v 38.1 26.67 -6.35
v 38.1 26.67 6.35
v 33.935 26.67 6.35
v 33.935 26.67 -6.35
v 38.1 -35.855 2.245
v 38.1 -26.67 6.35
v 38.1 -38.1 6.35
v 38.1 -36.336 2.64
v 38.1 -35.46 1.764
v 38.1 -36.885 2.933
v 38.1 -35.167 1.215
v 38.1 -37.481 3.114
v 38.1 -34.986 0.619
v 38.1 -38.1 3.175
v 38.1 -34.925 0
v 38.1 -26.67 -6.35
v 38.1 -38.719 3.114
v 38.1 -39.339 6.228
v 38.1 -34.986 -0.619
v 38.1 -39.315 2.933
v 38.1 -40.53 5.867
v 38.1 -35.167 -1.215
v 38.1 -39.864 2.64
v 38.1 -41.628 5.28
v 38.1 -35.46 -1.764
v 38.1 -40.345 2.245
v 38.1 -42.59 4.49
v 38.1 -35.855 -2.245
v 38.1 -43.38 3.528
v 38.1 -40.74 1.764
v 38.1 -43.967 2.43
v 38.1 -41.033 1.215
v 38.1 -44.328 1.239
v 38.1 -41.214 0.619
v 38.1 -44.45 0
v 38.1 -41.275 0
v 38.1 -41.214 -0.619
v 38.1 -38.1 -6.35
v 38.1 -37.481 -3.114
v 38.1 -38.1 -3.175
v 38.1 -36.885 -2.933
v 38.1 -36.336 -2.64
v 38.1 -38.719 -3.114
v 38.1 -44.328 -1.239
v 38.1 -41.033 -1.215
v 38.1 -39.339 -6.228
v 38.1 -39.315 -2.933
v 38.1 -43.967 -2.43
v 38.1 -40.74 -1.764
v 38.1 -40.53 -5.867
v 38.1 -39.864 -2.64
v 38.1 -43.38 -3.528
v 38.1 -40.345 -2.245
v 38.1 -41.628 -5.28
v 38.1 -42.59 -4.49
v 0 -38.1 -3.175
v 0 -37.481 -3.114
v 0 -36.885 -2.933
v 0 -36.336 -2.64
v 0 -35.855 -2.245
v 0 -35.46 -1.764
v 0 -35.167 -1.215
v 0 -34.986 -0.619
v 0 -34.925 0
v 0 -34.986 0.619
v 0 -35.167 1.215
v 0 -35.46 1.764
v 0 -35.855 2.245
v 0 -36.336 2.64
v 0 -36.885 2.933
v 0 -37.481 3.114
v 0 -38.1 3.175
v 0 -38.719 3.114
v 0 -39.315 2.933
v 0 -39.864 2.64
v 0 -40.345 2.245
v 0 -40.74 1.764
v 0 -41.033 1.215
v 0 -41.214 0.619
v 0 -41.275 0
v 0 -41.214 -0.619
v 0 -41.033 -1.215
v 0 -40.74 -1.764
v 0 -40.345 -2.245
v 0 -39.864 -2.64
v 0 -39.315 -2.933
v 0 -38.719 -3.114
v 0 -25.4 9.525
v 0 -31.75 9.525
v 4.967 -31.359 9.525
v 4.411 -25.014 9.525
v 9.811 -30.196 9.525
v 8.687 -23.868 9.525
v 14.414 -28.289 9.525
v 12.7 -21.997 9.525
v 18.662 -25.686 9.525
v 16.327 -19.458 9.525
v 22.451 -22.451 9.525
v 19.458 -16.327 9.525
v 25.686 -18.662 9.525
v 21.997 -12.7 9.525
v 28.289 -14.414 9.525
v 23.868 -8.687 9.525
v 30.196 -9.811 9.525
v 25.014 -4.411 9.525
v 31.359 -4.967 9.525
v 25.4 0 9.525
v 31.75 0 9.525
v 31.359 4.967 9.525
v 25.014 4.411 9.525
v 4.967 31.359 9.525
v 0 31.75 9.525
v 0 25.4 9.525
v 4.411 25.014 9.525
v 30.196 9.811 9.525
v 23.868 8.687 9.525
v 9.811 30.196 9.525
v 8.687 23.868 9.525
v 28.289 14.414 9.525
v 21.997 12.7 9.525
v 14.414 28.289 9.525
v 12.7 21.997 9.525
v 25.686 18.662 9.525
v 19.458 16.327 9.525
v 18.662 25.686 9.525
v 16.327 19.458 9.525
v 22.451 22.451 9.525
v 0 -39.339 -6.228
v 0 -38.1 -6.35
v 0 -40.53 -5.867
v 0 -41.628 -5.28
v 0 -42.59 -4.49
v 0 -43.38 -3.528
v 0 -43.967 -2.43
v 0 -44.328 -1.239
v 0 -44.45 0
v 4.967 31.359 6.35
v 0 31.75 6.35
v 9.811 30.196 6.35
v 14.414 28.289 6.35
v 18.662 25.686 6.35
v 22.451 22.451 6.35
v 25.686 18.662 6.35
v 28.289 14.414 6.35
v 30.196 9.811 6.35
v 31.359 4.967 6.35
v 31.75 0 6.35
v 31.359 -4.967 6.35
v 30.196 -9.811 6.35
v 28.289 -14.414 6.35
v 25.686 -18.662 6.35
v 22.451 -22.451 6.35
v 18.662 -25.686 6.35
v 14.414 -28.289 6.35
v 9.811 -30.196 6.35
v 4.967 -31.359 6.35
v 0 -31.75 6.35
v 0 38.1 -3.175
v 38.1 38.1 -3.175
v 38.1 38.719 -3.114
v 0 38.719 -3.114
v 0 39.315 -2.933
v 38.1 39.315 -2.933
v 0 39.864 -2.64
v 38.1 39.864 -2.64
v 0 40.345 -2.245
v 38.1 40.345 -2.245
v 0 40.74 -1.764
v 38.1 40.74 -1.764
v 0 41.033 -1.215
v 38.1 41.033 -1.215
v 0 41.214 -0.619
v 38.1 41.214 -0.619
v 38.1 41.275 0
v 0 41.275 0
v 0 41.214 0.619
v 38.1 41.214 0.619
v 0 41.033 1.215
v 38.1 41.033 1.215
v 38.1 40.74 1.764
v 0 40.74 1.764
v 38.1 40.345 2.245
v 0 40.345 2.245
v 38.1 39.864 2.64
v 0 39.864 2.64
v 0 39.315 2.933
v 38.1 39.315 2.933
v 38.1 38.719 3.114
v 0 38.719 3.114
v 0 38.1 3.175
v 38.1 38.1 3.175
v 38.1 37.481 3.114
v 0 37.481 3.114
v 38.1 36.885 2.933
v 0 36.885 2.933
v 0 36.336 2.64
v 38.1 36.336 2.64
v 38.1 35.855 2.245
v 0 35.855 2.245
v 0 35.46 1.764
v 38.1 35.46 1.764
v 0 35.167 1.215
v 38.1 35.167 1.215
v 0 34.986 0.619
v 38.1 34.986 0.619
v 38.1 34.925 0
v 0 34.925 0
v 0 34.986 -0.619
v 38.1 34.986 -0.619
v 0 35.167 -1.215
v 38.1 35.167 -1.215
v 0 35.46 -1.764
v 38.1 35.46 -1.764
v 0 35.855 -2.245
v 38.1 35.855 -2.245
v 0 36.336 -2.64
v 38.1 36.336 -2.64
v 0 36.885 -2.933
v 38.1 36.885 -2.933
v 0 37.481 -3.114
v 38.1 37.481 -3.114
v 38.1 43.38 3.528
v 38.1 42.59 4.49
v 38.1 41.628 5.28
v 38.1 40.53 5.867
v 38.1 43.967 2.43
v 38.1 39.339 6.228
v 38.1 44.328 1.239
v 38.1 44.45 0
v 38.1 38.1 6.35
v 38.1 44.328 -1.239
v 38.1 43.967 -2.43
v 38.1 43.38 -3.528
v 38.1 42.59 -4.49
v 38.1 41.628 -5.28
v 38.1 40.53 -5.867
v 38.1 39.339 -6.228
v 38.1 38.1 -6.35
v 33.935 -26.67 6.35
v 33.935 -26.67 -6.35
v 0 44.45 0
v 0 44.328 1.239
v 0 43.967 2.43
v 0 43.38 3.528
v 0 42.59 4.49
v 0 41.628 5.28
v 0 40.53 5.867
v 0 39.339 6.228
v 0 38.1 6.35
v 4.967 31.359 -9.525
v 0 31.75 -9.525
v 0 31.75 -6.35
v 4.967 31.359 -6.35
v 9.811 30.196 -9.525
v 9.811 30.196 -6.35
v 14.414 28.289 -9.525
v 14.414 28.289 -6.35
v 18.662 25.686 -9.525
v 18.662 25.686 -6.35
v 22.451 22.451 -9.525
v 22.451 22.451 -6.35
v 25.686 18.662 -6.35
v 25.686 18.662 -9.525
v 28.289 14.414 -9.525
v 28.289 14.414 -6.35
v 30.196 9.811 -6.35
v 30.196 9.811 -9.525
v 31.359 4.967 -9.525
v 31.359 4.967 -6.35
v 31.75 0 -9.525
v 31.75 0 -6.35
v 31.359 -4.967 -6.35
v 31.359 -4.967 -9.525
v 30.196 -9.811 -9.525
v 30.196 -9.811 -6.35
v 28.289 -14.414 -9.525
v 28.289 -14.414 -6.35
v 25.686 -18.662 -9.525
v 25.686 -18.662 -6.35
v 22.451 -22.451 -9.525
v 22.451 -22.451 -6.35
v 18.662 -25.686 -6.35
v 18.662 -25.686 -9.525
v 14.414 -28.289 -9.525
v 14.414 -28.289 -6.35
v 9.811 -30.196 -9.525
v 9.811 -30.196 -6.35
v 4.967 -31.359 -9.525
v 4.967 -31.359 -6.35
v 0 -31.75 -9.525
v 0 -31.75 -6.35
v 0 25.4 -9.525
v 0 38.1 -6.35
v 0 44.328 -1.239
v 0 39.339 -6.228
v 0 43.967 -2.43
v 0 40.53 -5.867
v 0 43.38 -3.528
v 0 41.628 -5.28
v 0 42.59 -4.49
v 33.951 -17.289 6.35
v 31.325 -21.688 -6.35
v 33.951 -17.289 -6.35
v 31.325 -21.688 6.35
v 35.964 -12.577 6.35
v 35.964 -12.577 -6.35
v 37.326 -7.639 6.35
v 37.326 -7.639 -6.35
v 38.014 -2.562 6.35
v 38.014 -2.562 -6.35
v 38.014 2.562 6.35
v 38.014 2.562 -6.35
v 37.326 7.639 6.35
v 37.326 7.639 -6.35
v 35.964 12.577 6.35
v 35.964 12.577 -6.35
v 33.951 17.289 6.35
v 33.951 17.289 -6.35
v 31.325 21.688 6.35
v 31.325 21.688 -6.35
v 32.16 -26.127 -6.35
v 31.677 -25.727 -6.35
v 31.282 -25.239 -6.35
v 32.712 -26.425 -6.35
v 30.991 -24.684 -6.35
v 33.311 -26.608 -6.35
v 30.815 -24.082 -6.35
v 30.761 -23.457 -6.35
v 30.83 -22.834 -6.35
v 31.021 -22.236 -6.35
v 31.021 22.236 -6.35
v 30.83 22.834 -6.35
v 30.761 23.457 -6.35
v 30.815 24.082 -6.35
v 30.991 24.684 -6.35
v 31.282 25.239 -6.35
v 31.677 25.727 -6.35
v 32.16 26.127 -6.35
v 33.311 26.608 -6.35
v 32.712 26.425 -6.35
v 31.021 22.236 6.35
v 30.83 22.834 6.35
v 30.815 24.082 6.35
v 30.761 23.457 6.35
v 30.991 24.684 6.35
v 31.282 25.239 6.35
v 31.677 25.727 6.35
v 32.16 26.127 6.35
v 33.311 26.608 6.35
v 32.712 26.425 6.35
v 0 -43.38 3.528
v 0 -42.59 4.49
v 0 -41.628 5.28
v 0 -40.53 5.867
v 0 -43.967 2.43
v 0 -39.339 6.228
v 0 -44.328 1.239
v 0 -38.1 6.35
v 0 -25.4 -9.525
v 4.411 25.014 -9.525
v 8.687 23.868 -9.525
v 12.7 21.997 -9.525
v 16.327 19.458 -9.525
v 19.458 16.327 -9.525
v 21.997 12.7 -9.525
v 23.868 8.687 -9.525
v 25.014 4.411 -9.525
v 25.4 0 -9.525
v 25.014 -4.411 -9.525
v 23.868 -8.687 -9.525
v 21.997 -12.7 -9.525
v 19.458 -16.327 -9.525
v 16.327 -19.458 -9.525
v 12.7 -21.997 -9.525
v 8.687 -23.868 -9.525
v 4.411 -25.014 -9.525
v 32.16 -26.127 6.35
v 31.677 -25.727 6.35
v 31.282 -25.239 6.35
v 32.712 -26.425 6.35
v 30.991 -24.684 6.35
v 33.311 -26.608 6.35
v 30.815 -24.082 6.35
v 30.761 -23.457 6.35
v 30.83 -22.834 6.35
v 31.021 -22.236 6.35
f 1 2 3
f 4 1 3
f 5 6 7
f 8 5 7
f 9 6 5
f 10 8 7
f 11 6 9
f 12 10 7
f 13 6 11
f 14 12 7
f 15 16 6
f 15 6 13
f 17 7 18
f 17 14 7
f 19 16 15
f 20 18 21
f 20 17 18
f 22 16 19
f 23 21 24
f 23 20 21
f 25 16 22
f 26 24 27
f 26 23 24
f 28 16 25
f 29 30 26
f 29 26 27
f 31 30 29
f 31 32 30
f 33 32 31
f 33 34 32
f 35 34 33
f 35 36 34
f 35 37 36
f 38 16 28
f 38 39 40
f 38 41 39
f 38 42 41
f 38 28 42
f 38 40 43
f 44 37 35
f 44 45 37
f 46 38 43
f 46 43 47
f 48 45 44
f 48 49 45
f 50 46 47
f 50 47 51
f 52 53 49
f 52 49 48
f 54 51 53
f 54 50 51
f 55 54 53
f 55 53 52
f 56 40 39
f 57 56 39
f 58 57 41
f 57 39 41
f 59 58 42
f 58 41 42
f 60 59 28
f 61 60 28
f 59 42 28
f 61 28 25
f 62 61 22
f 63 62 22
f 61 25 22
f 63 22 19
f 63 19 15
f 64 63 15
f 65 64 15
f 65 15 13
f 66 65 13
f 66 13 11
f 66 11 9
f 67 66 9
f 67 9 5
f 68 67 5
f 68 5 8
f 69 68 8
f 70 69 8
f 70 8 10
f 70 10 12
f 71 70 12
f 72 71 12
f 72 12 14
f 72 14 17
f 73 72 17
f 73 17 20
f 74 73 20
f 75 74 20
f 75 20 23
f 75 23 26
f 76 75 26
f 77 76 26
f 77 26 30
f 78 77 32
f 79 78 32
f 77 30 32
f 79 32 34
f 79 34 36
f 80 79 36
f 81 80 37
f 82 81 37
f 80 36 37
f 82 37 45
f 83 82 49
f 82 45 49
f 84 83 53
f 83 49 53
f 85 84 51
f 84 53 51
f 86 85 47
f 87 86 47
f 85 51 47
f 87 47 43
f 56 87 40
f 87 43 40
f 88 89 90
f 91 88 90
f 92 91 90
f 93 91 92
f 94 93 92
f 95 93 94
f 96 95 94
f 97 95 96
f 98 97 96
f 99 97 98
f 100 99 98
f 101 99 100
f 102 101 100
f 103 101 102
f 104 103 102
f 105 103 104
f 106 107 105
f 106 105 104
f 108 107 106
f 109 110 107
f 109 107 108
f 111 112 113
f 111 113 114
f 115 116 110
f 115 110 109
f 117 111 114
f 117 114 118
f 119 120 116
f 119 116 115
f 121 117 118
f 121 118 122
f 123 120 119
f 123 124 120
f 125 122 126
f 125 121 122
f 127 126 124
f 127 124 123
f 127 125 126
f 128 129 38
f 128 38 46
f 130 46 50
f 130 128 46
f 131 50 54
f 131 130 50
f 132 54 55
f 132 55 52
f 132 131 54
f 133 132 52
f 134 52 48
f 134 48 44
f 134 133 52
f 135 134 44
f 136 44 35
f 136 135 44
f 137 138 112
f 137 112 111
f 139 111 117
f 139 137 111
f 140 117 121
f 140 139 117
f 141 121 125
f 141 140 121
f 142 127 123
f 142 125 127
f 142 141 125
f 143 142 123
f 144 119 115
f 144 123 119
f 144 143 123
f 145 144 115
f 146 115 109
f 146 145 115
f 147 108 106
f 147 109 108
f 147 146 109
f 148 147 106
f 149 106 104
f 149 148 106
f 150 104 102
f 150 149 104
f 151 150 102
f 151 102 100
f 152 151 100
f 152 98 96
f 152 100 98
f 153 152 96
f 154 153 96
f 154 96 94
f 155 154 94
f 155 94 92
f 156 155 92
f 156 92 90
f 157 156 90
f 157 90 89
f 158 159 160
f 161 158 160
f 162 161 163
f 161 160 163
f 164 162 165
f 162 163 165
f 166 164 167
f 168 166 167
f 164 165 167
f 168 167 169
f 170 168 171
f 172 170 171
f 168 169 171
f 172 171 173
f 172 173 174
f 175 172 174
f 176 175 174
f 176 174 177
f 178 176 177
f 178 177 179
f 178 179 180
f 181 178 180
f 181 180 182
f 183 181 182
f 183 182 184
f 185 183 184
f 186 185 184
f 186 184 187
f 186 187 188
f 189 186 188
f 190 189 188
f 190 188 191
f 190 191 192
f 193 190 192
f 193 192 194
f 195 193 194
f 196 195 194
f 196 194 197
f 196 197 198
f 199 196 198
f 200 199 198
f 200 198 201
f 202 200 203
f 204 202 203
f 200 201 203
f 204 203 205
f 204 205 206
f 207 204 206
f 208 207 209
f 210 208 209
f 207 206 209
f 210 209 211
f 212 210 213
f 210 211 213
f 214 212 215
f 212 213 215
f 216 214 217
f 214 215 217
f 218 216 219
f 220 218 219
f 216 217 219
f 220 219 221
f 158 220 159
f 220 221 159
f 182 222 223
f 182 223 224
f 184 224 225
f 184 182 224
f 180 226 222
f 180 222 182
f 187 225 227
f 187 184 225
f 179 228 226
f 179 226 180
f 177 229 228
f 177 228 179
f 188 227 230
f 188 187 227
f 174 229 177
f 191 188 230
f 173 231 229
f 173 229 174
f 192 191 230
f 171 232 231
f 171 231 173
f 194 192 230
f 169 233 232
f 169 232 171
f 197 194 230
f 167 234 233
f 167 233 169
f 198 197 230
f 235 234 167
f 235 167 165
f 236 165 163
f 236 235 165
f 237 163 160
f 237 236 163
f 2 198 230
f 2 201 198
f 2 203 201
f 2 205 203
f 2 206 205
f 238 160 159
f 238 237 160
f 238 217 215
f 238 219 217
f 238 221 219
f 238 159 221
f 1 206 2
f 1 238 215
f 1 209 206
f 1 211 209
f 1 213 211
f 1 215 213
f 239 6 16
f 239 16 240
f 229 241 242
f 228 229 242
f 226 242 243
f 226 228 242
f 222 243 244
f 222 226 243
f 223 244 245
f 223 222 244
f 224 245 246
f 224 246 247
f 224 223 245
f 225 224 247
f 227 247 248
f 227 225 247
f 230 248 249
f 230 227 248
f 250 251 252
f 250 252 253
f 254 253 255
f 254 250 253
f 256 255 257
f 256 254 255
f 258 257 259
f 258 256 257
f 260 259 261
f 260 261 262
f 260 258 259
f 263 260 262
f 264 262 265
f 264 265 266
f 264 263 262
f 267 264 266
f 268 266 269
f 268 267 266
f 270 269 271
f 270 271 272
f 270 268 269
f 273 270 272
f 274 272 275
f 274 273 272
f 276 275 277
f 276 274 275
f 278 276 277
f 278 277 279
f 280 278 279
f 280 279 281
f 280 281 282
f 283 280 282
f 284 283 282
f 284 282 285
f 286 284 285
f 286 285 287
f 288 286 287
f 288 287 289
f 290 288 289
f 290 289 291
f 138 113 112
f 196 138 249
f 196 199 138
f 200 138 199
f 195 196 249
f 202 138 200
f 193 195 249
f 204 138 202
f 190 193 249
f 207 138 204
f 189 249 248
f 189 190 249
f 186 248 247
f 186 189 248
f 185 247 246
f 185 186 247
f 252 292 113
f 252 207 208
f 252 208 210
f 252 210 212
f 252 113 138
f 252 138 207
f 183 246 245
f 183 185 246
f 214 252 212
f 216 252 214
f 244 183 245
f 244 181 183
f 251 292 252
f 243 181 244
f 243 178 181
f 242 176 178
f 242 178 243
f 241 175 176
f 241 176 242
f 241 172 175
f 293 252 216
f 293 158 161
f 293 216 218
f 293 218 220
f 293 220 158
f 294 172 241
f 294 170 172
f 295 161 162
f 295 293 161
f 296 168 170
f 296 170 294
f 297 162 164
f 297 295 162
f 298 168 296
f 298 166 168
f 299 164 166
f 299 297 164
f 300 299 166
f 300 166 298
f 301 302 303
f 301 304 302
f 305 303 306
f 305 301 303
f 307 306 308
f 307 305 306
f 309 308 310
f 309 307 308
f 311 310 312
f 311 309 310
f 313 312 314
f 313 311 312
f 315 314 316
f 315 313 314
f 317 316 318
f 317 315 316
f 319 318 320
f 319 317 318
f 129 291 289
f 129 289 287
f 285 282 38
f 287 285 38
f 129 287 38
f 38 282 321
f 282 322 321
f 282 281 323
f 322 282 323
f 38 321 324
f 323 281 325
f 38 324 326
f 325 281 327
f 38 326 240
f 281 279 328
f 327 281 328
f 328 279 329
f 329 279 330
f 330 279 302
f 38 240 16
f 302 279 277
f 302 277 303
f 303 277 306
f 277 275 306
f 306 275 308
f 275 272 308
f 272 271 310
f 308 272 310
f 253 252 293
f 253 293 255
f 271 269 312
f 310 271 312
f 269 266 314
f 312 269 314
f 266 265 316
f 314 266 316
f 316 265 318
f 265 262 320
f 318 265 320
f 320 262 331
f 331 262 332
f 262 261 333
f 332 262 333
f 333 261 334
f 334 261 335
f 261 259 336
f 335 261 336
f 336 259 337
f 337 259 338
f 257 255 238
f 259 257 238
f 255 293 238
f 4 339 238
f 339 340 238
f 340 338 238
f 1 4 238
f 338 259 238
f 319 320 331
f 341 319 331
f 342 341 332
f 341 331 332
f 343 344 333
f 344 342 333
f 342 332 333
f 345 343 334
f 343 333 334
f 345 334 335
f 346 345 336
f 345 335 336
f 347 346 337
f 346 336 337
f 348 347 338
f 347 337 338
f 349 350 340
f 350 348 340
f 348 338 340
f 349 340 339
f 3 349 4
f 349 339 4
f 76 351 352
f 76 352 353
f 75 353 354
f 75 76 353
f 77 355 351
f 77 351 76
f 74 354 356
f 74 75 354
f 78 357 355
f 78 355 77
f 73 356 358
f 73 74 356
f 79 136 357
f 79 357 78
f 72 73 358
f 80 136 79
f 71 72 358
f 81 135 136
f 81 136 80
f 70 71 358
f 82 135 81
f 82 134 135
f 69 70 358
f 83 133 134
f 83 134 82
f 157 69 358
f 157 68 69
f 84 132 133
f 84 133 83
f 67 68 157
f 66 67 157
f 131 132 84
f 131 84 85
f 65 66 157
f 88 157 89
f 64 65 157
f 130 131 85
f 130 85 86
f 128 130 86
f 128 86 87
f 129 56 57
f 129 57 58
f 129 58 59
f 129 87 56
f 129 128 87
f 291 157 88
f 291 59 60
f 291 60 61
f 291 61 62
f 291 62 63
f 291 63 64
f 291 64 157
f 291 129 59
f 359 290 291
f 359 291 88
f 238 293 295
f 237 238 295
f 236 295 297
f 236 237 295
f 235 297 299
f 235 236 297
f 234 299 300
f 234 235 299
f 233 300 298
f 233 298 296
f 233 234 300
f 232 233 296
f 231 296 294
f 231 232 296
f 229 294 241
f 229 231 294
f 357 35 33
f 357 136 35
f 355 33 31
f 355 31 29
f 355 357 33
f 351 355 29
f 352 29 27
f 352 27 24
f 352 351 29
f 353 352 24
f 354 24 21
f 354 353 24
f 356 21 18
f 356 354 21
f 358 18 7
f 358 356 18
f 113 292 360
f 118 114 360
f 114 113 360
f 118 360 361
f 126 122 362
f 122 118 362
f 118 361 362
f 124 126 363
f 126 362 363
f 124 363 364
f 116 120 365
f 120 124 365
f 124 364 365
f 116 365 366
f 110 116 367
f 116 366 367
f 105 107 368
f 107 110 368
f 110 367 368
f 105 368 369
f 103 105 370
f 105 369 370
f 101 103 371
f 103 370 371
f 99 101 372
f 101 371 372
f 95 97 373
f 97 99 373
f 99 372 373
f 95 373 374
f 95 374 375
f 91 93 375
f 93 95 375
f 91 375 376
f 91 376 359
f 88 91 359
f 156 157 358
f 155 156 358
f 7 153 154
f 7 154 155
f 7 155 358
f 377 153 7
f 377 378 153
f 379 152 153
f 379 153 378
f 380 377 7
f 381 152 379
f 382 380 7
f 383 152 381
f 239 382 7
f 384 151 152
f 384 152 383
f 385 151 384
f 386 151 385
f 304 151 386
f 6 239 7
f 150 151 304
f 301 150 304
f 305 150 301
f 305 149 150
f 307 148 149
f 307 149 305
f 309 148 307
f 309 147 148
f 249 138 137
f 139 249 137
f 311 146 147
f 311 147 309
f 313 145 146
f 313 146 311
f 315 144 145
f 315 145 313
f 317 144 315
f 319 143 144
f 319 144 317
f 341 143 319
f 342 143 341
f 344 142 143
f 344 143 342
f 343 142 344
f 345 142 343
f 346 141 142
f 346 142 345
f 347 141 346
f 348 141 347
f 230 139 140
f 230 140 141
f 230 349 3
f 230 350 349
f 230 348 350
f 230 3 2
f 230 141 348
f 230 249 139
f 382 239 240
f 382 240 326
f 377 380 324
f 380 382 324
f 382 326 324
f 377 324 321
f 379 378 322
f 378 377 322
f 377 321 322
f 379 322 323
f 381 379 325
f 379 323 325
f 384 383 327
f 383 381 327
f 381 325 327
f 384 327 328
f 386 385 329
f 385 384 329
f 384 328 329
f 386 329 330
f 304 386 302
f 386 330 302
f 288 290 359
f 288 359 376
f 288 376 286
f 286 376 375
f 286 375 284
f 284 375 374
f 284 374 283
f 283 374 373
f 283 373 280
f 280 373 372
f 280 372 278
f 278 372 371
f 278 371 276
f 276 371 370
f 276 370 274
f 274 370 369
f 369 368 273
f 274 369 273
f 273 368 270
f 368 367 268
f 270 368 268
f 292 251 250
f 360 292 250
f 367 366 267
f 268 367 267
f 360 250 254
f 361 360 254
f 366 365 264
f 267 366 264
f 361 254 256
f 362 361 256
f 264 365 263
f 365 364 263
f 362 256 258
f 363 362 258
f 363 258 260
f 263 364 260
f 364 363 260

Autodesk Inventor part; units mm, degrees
ref_plane "YZ Plane" through (0, 0, 0) normal (1, 0, 0) x (0, 1, 0)
ref_plane "XZ Plane" through (0, 0, 0) normal (0, 1, 0) x (-1, 0, 0)
ref_plane "XY Plane" through (0, 0, 0) normal (0, 0, 1) x (1, 0, 0)
sketch "Sketch1" plane through (0, 0, 0) normal (0, 0, 1) x (1, 0, 0)
  arc A0 (0, -25.4) -> (0, 25.4) centre (0, 0) ccw
  line L0 (0, 25.4) -> (0, 44.45)
  line L1 (0, 44.45) -> (38.1, 44.45)
  line L2 (38.1, 44.45) -> (38.1, -44.45)
  line L3 (38.1, -44.45) -> (0, -44.45)
  line L4 (0, -44.45) -> (0, -25.4)
  dimension "d1" = 44.45
  dimension "d2" = 38.1
  dimension "d3" = 88.9
  dimension "d4" = 25.4
extrude "Extrusion1" add sketch "Sketch1" along normal mid plane 12.7
sketch "Sketch2" plane through (0, 0, 6.35) normal (0, 0, 1) x (1, 0, 0)
  line L0 (38.1, -44.45) -> (38.1, 44.45) projected
  line L1 (38.1, 26.67) -> (27.2088, 26.67)
  line L2 (38.1, 44.45) -> (0, 44.45) projected
  line L3 (38.1, -26.67) -> (27.2088, -26.67)
  line L4 (0, -44.45) -> (38.1, -44.45) projected
  arc A0 (27.2088, -26.67) -> (27.2088, 26.67) centre (0, 0) ccw
  point P0 (38.1, 0)
  dimension "d7" = 17.78
  dimension "d9" = 38.1
extrude "Extrusion2" cut sketch "Sketch2" against normal through all
sketch "Sketch3" plane through (0, 0, 0) normal (0, 0, 1) x (1, 0, 0)
  arc A0 (0, -31.75) -> (0, 31.75) centre (0, 0) ccw
  arc A1 (0, -25.4) -> (0, 25.4) centre (0, 0) ccw projected
  line L0 (0, 25.4) -> (0, 31.75)
  line L1 (0, 25.4) -> (0, 44.45) projected
  line L2 (0, -25.4) -> (0, -31.75)
  line L3 (0, -44.45) -> (0, -25.4) projected
  line L4 (0, 25.4) -> (0, 31.75)
  line L5 (0, -31.75) -> (0, -25.4)
  dimension "d14" = 31.75
extrude "Extrusion3" add sketch "Sketch3" along normal mid plane 19.05
fillet "Fillet1" radius 3.175 2 edges at (27.2088, -26.67, 0) (27.2088, 26.67, 0)
fillet "Fillet2" radius 6.35 4 edges at (19.05, 44.45, 6.35) (19.05, 44.45, -6.35) (19.05, -44.45, 6.35) (19.05, -44.45, -6.35)
sketch "Sketch4" plane through (38.1, -26.67, 6.35) normal (1, 0, 0) x (0, 0, -1)
  circle A0 centre (6.35, 64.77) radius 3.175
  circle A1 centre (6.35, -11.43) radius 3.175
  arc A2 (0, -11.43) -> (12.7, -11.43) centre (6.35, -11.43) ccw projected
  arc A3 (12.7, 64.77) -> (0, 64.77) centre (6.35, 64.77) ccw projected
  point P0 (6.35, 26.67)
  dimension "d19" = 6.35
extrude "Extrusion4" cut sketch "Sketch4" against normal through all
properties part number "rodcap"
